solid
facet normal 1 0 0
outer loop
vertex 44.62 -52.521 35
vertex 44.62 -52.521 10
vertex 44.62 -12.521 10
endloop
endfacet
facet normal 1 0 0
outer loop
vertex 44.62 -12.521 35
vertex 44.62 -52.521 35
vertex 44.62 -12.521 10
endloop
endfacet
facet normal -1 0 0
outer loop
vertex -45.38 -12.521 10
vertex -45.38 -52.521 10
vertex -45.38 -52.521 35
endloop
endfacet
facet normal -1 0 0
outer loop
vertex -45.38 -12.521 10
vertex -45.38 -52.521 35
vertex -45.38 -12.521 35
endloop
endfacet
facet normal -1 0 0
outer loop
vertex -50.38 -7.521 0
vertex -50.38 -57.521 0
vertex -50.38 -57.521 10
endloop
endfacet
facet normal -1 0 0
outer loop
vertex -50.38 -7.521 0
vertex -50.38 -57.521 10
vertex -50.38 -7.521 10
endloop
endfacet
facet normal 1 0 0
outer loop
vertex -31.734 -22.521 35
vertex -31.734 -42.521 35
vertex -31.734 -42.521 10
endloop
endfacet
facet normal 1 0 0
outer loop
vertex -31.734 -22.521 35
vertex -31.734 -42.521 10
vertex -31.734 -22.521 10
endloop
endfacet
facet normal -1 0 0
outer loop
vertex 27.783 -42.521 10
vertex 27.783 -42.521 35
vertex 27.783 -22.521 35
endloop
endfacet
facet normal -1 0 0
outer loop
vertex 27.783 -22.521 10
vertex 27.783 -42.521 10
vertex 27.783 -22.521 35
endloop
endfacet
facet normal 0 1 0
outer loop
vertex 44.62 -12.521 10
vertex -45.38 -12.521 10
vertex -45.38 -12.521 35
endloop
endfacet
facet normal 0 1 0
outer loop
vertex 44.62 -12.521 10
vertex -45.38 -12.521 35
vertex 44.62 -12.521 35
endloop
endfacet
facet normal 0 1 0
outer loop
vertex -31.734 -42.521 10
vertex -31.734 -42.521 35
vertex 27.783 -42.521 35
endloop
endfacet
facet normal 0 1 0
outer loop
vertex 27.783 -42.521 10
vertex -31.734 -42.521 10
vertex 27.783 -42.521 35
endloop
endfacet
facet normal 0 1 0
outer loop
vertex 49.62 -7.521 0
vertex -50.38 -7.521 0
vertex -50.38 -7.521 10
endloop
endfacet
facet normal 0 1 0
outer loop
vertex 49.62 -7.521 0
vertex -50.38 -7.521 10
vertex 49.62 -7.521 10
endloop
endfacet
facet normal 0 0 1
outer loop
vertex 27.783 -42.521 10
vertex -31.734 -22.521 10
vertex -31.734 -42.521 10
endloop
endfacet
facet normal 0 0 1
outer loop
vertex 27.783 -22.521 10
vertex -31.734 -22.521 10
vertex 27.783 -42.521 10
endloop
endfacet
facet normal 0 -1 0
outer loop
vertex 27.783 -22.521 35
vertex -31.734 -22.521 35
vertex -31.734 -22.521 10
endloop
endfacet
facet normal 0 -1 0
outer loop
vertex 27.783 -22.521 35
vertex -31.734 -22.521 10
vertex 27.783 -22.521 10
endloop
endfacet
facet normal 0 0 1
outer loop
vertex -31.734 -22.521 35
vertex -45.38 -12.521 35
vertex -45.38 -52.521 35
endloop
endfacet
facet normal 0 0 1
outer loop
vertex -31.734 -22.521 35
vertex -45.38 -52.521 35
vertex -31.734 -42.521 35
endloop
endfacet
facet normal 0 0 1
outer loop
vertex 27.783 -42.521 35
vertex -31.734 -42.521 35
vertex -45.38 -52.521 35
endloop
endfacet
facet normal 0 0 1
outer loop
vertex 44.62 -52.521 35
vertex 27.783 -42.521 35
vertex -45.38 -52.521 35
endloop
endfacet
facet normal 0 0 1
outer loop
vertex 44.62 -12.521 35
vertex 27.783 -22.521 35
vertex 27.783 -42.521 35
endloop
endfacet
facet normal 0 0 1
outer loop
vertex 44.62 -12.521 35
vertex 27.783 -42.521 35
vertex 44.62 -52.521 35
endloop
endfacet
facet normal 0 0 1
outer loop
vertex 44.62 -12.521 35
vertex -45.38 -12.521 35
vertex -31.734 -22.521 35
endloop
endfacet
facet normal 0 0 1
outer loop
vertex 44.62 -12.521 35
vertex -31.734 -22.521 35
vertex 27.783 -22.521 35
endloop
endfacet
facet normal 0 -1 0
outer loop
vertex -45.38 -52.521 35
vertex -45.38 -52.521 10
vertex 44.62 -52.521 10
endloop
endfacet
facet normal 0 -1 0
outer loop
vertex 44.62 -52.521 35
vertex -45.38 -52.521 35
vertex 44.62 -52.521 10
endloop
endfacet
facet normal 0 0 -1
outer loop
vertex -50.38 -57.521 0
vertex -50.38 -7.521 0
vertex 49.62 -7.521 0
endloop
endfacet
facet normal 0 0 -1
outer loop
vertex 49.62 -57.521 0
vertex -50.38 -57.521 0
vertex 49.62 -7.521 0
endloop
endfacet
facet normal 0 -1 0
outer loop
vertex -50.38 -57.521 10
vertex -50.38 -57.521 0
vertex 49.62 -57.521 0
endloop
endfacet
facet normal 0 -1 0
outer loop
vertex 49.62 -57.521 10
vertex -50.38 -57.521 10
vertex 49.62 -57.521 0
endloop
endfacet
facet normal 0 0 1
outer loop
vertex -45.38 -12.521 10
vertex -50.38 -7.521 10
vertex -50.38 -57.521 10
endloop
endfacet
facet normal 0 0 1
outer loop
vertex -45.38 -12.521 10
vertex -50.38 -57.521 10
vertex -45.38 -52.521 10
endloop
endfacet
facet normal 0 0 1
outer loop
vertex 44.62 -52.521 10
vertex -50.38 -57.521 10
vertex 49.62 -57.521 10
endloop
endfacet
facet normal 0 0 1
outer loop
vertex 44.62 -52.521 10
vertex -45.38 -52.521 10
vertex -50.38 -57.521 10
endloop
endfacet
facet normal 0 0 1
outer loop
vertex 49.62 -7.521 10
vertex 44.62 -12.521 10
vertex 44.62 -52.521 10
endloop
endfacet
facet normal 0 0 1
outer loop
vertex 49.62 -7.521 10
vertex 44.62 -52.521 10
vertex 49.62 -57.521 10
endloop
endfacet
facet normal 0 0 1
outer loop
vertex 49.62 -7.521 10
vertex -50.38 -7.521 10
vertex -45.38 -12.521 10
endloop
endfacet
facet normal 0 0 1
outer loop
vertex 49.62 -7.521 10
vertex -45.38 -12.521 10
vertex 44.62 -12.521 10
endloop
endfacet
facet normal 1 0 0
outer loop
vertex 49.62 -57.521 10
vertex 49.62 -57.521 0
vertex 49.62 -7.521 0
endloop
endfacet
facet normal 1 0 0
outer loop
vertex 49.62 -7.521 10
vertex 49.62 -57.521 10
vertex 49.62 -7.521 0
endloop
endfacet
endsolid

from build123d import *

# Parameters (mm, degrees)
F0_W     = 100
F0_H     = 50
F1_DEPTH = 10
F2_W     = 90
F2_H     = 40
F3_DEPTH = 5
F4_DEPTH = 25
F5_W     = 59.516436
F5_H     = 20
F6_DEPTH = 25


with BuildPart() as f1:
    # F0 (on Top) → F1 (new body)
    with BuildSketch(Plane.XY):
        with Locations((-0.379814, -32.520819)):
            Rectangle(F0_W, F0_H)
    extrude(amount=F1_DEPTH)

    # F2 (on face) → F3 (join)
    with BuildSketch(Plane.XY.offset(10)):
        with Locations((-0.379814, -32.520819)):
            Rectangle(F2_W, F2_H)
    extrude(amount=F3_DEPTH)

    # F2 (on face) → F4 (join)
    with BuildSketch(Plane.XY.offset(10)):
        with Locations((-0.379814, -32.520819)):
            Rectangle(F2_W, F2_H)
    extrude(amount=F4_DEPTH)

    # F5 (on face) → F6 (cut)
    with BuildSketch(Plane.XY.offset(35)):
        with Locations((-1.975571, -32.520819)):
            Rectangle(F5_W, F5_H)
    extrude(amount=-F6_DEPTH, mode=Mode.SUBTRACT)


solid = f1.part
